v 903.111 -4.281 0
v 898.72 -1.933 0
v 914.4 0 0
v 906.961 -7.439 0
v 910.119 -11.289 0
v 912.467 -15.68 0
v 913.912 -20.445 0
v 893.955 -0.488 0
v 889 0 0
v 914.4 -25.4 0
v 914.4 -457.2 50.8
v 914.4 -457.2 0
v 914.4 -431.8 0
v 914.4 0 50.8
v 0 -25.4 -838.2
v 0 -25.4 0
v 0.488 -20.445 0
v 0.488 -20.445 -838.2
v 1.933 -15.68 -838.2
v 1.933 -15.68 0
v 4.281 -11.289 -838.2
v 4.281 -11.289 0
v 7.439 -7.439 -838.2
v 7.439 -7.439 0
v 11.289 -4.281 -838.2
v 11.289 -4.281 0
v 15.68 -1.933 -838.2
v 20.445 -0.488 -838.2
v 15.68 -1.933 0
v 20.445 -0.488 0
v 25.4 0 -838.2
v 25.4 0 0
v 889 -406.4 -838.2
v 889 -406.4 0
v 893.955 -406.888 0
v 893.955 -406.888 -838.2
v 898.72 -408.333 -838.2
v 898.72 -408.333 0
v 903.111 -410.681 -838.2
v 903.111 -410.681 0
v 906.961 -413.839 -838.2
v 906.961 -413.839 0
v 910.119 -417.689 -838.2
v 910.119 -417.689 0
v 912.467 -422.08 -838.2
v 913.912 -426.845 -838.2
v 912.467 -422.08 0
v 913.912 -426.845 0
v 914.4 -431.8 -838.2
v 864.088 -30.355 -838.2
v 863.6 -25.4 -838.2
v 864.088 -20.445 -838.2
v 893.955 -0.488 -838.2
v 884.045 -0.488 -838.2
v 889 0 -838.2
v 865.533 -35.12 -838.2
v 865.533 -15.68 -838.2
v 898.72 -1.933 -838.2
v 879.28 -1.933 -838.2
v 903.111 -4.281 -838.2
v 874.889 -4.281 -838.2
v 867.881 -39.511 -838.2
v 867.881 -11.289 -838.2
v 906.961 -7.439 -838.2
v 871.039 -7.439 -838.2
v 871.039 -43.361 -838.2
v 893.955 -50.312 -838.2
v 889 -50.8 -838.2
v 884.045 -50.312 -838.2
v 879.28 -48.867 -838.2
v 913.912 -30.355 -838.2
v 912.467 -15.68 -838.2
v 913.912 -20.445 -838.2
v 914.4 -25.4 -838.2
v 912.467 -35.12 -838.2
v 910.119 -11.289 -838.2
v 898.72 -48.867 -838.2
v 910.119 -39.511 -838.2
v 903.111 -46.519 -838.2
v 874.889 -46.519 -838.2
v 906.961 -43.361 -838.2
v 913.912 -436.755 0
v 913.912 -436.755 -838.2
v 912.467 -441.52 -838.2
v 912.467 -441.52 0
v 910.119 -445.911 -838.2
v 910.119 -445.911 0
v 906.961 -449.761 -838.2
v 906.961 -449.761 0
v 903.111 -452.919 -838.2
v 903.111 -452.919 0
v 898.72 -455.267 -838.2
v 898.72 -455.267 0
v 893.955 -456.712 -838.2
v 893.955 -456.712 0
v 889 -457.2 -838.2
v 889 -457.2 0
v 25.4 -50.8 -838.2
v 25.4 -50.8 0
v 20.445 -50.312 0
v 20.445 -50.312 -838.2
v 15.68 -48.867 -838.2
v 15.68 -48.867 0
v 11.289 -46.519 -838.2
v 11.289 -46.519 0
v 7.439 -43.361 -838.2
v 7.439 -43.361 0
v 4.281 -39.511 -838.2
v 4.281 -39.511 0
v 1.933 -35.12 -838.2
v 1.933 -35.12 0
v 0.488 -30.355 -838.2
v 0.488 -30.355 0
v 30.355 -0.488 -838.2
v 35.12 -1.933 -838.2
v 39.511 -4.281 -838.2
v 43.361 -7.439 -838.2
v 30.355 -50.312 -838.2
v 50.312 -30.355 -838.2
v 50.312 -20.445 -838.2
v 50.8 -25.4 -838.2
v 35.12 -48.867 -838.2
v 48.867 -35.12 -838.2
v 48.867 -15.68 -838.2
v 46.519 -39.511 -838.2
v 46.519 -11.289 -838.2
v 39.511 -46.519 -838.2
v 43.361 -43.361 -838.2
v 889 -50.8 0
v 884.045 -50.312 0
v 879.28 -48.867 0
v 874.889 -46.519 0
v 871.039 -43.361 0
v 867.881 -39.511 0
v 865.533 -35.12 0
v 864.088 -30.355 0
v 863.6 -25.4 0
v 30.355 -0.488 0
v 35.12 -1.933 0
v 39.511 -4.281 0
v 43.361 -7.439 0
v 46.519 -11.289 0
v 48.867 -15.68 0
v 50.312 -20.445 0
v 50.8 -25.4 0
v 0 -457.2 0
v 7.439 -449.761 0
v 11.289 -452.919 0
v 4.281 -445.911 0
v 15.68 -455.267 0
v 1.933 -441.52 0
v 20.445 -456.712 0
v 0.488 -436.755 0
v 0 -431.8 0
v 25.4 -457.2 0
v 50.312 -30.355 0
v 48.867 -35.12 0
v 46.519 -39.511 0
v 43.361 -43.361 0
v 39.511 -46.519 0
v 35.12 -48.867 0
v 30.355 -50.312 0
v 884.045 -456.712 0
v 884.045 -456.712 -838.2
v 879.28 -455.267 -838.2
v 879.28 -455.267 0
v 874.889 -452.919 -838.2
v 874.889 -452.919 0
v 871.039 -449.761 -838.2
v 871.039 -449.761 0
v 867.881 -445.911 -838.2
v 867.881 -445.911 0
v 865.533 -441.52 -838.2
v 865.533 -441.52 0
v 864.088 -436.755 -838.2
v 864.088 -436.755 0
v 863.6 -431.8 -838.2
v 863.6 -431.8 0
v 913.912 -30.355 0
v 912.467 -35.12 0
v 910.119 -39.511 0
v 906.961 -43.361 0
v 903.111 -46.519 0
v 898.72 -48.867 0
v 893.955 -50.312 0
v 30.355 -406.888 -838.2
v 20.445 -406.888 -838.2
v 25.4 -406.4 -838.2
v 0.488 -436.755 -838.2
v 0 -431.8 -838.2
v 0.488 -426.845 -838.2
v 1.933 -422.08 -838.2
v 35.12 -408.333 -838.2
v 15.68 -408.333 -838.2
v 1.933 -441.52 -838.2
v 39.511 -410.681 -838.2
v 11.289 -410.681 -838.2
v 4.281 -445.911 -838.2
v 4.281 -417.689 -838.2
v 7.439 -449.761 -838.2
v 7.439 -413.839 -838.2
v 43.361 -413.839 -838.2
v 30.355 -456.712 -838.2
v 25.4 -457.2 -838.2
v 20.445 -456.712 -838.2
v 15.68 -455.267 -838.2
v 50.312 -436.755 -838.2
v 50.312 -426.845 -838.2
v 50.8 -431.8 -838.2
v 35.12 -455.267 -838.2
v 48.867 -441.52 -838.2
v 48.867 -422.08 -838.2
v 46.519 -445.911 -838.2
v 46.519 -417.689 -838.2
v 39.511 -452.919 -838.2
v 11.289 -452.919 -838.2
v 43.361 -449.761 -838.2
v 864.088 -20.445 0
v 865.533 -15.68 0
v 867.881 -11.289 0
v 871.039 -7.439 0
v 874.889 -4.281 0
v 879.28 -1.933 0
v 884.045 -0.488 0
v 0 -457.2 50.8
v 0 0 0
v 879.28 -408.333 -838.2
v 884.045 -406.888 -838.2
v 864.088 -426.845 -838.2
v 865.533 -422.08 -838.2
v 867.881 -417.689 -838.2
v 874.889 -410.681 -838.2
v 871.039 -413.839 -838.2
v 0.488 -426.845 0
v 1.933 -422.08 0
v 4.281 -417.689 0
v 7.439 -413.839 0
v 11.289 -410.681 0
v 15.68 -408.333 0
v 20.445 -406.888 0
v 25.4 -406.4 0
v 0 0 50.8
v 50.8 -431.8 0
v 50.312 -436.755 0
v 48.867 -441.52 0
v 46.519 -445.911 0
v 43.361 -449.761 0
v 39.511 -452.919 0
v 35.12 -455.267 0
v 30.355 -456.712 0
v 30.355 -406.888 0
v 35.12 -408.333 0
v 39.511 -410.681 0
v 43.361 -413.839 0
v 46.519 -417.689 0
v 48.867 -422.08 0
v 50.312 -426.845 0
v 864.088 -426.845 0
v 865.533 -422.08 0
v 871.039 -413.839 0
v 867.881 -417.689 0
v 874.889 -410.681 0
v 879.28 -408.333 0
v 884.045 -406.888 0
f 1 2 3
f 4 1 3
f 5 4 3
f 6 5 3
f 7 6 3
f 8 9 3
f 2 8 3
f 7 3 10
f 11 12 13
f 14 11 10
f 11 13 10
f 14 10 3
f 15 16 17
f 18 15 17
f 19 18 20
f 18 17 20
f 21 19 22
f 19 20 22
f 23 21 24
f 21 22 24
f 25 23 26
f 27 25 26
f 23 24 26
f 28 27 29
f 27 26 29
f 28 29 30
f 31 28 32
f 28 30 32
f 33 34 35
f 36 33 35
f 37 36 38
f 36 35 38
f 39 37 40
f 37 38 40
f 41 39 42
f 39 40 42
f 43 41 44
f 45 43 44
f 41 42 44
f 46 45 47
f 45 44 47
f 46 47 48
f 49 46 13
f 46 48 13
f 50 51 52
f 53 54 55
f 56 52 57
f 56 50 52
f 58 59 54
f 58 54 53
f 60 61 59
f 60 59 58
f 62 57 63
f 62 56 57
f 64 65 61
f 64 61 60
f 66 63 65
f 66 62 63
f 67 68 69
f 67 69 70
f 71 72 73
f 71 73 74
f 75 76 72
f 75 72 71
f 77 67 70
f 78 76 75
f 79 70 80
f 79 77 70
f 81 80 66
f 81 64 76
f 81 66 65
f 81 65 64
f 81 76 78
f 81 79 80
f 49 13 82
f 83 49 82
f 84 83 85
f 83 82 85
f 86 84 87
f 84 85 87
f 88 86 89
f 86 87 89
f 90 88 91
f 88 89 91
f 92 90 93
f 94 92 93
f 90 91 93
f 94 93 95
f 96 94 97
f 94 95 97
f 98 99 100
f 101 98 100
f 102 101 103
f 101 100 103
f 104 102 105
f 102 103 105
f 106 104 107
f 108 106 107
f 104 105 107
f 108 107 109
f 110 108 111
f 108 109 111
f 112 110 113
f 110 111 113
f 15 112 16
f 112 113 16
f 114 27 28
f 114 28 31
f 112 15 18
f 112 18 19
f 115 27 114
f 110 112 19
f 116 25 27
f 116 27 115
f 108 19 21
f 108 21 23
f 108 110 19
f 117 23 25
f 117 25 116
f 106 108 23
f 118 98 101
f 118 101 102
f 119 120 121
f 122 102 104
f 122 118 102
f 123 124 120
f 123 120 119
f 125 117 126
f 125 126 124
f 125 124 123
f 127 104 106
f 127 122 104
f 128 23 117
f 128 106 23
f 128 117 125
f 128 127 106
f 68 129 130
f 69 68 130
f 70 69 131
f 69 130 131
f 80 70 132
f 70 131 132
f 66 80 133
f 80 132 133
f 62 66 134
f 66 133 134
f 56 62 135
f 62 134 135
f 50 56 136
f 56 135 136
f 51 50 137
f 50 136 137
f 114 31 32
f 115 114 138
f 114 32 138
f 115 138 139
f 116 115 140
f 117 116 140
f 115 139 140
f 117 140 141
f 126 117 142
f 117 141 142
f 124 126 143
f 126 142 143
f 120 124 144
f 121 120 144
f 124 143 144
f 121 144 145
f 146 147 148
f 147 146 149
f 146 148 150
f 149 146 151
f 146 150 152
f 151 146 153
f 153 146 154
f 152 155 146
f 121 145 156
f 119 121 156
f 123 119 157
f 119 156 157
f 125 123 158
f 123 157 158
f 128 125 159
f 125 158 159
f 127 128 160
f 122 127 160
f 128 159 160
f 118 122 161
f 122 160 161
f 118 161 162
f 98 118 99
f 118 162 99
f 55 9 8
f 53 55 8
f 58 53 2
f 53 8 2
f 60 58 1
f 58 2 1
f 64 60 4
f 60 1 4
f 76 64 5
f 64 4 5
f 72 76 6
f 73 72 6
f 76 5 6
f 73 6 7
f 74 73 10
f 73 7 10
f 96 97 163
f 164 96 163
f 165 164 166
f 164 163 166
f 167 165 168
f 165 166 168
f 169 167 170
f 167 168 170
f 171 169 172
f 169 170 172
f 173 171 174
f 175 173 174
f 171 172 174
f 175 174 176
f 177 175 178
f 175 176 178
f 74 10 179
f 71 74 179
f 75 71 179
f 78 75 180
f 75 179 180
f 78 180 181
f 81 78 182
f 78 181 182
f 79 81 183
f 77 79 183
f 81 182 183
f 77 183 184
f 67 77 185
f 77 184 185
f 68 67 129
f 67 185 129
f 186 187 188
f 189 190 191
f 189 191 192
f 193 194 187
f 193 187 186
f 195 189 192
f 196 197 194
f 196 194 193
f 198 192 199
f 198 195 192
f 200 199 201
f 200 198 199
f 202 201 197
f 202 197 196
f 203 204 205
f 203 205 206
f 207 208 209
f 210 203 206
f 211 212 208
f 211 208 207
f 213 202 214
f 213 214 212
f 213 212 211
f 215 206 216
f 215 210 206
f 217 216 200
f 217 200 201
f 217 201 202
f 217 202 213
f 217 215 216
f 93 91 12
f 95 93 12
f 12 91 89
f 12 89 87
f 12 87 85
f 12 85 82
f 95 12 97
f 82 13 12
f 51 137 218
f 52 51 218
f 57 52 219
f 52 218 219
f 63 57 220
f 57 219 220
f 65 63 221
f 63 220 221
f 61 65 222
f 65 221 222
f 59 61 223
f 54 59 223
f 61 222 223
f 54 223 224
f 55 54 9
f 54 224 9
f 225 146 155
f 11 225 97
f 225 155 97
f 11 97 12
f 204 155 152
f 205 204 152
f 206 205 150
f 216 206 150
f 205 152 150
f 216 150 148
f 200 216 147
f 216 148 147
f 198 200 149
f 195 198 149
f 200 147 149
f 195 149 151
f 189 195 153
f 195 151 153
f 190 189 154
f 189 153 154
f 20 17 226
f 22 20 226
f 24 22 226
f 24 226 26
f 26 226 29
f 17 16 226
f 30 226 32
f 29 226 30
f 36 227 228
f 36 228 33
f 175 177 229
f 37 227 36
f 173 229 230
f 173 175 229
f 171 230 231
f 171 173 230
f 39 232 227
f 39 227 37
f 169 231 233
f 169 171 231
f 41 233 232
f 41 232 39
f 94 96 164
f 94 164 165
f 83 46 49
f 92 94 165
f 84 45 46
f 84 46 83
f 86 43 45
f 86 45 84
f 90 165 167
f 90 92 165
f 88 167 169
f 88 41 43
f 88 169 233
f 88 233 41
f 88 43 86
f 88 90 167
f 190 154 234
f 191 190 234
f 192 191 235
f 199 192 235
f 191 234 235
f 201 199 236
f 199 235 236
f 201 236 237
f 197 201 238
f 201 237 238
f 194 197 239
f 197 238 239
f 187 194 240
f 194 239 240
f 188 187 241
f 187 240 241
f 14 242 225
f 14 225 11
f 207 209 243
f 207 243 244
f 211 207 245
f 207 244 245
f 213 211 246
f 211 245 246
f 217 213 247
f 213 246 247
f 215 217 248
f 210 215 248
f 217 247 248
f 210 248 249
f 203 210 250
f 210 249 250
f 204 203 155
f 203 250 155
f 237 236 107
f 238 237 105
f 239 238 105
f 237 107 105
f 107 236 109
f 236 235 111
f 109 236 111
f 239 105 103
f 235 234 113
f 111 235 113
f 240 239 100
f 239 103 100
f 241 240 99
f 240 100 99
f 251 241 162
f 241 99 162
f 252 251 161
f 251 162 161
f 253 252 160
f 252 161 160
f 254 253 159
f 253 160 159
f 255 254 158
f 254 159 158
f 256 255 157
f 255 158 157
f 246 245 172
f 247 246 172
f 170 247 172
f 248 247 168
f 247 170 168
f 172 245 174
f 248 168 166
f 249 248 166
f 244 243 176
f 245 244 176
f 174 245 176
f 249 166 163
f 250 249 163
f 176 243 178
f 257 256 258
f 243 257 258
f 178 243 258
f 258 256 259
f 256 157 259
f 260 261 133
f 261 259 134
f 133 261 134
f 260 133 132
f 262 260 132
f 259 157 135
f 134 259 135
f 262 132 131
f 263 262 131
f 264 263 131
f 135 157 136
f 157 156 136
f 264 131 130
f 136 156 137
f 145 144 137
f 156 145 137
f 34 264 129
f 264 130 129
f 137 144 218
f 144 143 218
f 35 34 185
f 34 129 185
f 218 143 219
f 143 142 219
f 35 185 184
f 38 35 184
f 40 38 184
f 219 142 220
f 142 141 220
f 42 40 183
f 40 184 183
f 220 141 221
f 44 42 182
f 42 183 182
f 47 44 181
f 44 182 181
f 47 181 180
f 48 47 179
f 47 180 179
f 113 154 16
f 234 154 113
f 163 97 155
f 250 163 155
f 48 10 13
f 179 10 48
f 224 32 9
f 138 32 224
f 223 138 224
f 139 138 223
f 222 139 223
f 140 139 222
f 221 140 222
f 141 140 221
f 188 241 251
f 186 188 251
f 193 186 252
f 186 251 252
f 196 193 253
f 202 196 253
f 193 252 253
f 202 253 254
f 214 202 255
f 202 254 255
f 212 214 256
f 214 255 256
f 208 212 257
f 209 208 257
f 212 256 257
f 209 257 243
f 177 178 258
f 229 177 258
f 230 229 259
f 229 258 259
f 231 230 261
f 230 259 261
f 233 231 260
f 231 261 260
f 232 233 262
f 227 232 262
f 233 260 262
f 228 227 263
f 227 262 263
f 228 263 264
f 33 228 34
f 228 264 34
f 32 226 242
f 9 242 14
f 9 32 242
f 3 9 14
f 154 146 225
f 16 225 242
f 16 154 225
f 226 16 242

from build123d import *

# Parameters (mm, degrees)
F0_W     = 914.4
F0_H     = 457.2
F1_DEPTH = 50.8
F3_DEPTH = 838.2


with BuildPart() as f1:
    # F0 (on Top) → F1 (new body)
    with BuildSketch(Plane.XY):
        with Locations((457.2, -228.6)):
            Rectangle(F0_W, F0_H)
    extrude(amount=F1_DEPTH)

    # F2 (on face) → F3 (join)
    with BuildSketch(Plane(origin=(0, 0, 0), x_dir=(1, 0, 0), z_dir=(0, 0, -1))):
        with BuildLine():
            ThreePointArc((914.4, 431.8), (906.960512, 449.760512), (889, 457.2))
            ThreePointArc((889, 457.2), (871.039488, 449.760512), (863.6, 431.8))
            ThreePointArc((863.6, 431.8), (871.039488, 413.839488), (889, 406.4))
            ThreePointArc((889, 406.4), (906.960512, 413.839488), (914.4, 431.8))
        make_face()
        with BuildLine():
            ThreePointArc((914.4, 25.4), (906.960512, 43.360512), (889, 50.8))
            ThreePointArc((889, 50.8), (871.039488, 43.360512), (863.6, 25.4))
            ThreePointArc((863.6, 25.4), (871.039488, 7.439488), (889, 0))
            ThreePointArc((889, 0), (906.960512, 7.439488), (914.4, 25.4))
        make_face()
        with BuildLine():
            ThreePointArc((50.8, 25.4), (43.360512, 43.360512), (25.4, 50.8))
            ThreePointArc((25.4, 50.8), (7.439488, 43.360512), (0, 25.4))
            ThreePointArc((0, 25.4), (7.439488, 7.439488), (25.4, 0))
            ThreePointArc((25.4, 0), (43.360512, 7.439488), (50.8, 25.4))
        make_face()
        with BuildLine():
            ThreePointArc((50.8, 431.8), (43.360512, 449.760512), (25.4, 457.2))
            ThreePointArc((25.4, 457.2), (7.439488, 449.760512), (0, 431.8))
            ThreePointArc((0, 431.8), (7.439488, 413.839488), (25.4, 406.4))
            ThreePointArc((25.4, 406.4), (43.360512, 413.839488), (50.8, 431.8))
        make_face()
    extrude(amount=F3_DEPTH)


solid = f1.part
